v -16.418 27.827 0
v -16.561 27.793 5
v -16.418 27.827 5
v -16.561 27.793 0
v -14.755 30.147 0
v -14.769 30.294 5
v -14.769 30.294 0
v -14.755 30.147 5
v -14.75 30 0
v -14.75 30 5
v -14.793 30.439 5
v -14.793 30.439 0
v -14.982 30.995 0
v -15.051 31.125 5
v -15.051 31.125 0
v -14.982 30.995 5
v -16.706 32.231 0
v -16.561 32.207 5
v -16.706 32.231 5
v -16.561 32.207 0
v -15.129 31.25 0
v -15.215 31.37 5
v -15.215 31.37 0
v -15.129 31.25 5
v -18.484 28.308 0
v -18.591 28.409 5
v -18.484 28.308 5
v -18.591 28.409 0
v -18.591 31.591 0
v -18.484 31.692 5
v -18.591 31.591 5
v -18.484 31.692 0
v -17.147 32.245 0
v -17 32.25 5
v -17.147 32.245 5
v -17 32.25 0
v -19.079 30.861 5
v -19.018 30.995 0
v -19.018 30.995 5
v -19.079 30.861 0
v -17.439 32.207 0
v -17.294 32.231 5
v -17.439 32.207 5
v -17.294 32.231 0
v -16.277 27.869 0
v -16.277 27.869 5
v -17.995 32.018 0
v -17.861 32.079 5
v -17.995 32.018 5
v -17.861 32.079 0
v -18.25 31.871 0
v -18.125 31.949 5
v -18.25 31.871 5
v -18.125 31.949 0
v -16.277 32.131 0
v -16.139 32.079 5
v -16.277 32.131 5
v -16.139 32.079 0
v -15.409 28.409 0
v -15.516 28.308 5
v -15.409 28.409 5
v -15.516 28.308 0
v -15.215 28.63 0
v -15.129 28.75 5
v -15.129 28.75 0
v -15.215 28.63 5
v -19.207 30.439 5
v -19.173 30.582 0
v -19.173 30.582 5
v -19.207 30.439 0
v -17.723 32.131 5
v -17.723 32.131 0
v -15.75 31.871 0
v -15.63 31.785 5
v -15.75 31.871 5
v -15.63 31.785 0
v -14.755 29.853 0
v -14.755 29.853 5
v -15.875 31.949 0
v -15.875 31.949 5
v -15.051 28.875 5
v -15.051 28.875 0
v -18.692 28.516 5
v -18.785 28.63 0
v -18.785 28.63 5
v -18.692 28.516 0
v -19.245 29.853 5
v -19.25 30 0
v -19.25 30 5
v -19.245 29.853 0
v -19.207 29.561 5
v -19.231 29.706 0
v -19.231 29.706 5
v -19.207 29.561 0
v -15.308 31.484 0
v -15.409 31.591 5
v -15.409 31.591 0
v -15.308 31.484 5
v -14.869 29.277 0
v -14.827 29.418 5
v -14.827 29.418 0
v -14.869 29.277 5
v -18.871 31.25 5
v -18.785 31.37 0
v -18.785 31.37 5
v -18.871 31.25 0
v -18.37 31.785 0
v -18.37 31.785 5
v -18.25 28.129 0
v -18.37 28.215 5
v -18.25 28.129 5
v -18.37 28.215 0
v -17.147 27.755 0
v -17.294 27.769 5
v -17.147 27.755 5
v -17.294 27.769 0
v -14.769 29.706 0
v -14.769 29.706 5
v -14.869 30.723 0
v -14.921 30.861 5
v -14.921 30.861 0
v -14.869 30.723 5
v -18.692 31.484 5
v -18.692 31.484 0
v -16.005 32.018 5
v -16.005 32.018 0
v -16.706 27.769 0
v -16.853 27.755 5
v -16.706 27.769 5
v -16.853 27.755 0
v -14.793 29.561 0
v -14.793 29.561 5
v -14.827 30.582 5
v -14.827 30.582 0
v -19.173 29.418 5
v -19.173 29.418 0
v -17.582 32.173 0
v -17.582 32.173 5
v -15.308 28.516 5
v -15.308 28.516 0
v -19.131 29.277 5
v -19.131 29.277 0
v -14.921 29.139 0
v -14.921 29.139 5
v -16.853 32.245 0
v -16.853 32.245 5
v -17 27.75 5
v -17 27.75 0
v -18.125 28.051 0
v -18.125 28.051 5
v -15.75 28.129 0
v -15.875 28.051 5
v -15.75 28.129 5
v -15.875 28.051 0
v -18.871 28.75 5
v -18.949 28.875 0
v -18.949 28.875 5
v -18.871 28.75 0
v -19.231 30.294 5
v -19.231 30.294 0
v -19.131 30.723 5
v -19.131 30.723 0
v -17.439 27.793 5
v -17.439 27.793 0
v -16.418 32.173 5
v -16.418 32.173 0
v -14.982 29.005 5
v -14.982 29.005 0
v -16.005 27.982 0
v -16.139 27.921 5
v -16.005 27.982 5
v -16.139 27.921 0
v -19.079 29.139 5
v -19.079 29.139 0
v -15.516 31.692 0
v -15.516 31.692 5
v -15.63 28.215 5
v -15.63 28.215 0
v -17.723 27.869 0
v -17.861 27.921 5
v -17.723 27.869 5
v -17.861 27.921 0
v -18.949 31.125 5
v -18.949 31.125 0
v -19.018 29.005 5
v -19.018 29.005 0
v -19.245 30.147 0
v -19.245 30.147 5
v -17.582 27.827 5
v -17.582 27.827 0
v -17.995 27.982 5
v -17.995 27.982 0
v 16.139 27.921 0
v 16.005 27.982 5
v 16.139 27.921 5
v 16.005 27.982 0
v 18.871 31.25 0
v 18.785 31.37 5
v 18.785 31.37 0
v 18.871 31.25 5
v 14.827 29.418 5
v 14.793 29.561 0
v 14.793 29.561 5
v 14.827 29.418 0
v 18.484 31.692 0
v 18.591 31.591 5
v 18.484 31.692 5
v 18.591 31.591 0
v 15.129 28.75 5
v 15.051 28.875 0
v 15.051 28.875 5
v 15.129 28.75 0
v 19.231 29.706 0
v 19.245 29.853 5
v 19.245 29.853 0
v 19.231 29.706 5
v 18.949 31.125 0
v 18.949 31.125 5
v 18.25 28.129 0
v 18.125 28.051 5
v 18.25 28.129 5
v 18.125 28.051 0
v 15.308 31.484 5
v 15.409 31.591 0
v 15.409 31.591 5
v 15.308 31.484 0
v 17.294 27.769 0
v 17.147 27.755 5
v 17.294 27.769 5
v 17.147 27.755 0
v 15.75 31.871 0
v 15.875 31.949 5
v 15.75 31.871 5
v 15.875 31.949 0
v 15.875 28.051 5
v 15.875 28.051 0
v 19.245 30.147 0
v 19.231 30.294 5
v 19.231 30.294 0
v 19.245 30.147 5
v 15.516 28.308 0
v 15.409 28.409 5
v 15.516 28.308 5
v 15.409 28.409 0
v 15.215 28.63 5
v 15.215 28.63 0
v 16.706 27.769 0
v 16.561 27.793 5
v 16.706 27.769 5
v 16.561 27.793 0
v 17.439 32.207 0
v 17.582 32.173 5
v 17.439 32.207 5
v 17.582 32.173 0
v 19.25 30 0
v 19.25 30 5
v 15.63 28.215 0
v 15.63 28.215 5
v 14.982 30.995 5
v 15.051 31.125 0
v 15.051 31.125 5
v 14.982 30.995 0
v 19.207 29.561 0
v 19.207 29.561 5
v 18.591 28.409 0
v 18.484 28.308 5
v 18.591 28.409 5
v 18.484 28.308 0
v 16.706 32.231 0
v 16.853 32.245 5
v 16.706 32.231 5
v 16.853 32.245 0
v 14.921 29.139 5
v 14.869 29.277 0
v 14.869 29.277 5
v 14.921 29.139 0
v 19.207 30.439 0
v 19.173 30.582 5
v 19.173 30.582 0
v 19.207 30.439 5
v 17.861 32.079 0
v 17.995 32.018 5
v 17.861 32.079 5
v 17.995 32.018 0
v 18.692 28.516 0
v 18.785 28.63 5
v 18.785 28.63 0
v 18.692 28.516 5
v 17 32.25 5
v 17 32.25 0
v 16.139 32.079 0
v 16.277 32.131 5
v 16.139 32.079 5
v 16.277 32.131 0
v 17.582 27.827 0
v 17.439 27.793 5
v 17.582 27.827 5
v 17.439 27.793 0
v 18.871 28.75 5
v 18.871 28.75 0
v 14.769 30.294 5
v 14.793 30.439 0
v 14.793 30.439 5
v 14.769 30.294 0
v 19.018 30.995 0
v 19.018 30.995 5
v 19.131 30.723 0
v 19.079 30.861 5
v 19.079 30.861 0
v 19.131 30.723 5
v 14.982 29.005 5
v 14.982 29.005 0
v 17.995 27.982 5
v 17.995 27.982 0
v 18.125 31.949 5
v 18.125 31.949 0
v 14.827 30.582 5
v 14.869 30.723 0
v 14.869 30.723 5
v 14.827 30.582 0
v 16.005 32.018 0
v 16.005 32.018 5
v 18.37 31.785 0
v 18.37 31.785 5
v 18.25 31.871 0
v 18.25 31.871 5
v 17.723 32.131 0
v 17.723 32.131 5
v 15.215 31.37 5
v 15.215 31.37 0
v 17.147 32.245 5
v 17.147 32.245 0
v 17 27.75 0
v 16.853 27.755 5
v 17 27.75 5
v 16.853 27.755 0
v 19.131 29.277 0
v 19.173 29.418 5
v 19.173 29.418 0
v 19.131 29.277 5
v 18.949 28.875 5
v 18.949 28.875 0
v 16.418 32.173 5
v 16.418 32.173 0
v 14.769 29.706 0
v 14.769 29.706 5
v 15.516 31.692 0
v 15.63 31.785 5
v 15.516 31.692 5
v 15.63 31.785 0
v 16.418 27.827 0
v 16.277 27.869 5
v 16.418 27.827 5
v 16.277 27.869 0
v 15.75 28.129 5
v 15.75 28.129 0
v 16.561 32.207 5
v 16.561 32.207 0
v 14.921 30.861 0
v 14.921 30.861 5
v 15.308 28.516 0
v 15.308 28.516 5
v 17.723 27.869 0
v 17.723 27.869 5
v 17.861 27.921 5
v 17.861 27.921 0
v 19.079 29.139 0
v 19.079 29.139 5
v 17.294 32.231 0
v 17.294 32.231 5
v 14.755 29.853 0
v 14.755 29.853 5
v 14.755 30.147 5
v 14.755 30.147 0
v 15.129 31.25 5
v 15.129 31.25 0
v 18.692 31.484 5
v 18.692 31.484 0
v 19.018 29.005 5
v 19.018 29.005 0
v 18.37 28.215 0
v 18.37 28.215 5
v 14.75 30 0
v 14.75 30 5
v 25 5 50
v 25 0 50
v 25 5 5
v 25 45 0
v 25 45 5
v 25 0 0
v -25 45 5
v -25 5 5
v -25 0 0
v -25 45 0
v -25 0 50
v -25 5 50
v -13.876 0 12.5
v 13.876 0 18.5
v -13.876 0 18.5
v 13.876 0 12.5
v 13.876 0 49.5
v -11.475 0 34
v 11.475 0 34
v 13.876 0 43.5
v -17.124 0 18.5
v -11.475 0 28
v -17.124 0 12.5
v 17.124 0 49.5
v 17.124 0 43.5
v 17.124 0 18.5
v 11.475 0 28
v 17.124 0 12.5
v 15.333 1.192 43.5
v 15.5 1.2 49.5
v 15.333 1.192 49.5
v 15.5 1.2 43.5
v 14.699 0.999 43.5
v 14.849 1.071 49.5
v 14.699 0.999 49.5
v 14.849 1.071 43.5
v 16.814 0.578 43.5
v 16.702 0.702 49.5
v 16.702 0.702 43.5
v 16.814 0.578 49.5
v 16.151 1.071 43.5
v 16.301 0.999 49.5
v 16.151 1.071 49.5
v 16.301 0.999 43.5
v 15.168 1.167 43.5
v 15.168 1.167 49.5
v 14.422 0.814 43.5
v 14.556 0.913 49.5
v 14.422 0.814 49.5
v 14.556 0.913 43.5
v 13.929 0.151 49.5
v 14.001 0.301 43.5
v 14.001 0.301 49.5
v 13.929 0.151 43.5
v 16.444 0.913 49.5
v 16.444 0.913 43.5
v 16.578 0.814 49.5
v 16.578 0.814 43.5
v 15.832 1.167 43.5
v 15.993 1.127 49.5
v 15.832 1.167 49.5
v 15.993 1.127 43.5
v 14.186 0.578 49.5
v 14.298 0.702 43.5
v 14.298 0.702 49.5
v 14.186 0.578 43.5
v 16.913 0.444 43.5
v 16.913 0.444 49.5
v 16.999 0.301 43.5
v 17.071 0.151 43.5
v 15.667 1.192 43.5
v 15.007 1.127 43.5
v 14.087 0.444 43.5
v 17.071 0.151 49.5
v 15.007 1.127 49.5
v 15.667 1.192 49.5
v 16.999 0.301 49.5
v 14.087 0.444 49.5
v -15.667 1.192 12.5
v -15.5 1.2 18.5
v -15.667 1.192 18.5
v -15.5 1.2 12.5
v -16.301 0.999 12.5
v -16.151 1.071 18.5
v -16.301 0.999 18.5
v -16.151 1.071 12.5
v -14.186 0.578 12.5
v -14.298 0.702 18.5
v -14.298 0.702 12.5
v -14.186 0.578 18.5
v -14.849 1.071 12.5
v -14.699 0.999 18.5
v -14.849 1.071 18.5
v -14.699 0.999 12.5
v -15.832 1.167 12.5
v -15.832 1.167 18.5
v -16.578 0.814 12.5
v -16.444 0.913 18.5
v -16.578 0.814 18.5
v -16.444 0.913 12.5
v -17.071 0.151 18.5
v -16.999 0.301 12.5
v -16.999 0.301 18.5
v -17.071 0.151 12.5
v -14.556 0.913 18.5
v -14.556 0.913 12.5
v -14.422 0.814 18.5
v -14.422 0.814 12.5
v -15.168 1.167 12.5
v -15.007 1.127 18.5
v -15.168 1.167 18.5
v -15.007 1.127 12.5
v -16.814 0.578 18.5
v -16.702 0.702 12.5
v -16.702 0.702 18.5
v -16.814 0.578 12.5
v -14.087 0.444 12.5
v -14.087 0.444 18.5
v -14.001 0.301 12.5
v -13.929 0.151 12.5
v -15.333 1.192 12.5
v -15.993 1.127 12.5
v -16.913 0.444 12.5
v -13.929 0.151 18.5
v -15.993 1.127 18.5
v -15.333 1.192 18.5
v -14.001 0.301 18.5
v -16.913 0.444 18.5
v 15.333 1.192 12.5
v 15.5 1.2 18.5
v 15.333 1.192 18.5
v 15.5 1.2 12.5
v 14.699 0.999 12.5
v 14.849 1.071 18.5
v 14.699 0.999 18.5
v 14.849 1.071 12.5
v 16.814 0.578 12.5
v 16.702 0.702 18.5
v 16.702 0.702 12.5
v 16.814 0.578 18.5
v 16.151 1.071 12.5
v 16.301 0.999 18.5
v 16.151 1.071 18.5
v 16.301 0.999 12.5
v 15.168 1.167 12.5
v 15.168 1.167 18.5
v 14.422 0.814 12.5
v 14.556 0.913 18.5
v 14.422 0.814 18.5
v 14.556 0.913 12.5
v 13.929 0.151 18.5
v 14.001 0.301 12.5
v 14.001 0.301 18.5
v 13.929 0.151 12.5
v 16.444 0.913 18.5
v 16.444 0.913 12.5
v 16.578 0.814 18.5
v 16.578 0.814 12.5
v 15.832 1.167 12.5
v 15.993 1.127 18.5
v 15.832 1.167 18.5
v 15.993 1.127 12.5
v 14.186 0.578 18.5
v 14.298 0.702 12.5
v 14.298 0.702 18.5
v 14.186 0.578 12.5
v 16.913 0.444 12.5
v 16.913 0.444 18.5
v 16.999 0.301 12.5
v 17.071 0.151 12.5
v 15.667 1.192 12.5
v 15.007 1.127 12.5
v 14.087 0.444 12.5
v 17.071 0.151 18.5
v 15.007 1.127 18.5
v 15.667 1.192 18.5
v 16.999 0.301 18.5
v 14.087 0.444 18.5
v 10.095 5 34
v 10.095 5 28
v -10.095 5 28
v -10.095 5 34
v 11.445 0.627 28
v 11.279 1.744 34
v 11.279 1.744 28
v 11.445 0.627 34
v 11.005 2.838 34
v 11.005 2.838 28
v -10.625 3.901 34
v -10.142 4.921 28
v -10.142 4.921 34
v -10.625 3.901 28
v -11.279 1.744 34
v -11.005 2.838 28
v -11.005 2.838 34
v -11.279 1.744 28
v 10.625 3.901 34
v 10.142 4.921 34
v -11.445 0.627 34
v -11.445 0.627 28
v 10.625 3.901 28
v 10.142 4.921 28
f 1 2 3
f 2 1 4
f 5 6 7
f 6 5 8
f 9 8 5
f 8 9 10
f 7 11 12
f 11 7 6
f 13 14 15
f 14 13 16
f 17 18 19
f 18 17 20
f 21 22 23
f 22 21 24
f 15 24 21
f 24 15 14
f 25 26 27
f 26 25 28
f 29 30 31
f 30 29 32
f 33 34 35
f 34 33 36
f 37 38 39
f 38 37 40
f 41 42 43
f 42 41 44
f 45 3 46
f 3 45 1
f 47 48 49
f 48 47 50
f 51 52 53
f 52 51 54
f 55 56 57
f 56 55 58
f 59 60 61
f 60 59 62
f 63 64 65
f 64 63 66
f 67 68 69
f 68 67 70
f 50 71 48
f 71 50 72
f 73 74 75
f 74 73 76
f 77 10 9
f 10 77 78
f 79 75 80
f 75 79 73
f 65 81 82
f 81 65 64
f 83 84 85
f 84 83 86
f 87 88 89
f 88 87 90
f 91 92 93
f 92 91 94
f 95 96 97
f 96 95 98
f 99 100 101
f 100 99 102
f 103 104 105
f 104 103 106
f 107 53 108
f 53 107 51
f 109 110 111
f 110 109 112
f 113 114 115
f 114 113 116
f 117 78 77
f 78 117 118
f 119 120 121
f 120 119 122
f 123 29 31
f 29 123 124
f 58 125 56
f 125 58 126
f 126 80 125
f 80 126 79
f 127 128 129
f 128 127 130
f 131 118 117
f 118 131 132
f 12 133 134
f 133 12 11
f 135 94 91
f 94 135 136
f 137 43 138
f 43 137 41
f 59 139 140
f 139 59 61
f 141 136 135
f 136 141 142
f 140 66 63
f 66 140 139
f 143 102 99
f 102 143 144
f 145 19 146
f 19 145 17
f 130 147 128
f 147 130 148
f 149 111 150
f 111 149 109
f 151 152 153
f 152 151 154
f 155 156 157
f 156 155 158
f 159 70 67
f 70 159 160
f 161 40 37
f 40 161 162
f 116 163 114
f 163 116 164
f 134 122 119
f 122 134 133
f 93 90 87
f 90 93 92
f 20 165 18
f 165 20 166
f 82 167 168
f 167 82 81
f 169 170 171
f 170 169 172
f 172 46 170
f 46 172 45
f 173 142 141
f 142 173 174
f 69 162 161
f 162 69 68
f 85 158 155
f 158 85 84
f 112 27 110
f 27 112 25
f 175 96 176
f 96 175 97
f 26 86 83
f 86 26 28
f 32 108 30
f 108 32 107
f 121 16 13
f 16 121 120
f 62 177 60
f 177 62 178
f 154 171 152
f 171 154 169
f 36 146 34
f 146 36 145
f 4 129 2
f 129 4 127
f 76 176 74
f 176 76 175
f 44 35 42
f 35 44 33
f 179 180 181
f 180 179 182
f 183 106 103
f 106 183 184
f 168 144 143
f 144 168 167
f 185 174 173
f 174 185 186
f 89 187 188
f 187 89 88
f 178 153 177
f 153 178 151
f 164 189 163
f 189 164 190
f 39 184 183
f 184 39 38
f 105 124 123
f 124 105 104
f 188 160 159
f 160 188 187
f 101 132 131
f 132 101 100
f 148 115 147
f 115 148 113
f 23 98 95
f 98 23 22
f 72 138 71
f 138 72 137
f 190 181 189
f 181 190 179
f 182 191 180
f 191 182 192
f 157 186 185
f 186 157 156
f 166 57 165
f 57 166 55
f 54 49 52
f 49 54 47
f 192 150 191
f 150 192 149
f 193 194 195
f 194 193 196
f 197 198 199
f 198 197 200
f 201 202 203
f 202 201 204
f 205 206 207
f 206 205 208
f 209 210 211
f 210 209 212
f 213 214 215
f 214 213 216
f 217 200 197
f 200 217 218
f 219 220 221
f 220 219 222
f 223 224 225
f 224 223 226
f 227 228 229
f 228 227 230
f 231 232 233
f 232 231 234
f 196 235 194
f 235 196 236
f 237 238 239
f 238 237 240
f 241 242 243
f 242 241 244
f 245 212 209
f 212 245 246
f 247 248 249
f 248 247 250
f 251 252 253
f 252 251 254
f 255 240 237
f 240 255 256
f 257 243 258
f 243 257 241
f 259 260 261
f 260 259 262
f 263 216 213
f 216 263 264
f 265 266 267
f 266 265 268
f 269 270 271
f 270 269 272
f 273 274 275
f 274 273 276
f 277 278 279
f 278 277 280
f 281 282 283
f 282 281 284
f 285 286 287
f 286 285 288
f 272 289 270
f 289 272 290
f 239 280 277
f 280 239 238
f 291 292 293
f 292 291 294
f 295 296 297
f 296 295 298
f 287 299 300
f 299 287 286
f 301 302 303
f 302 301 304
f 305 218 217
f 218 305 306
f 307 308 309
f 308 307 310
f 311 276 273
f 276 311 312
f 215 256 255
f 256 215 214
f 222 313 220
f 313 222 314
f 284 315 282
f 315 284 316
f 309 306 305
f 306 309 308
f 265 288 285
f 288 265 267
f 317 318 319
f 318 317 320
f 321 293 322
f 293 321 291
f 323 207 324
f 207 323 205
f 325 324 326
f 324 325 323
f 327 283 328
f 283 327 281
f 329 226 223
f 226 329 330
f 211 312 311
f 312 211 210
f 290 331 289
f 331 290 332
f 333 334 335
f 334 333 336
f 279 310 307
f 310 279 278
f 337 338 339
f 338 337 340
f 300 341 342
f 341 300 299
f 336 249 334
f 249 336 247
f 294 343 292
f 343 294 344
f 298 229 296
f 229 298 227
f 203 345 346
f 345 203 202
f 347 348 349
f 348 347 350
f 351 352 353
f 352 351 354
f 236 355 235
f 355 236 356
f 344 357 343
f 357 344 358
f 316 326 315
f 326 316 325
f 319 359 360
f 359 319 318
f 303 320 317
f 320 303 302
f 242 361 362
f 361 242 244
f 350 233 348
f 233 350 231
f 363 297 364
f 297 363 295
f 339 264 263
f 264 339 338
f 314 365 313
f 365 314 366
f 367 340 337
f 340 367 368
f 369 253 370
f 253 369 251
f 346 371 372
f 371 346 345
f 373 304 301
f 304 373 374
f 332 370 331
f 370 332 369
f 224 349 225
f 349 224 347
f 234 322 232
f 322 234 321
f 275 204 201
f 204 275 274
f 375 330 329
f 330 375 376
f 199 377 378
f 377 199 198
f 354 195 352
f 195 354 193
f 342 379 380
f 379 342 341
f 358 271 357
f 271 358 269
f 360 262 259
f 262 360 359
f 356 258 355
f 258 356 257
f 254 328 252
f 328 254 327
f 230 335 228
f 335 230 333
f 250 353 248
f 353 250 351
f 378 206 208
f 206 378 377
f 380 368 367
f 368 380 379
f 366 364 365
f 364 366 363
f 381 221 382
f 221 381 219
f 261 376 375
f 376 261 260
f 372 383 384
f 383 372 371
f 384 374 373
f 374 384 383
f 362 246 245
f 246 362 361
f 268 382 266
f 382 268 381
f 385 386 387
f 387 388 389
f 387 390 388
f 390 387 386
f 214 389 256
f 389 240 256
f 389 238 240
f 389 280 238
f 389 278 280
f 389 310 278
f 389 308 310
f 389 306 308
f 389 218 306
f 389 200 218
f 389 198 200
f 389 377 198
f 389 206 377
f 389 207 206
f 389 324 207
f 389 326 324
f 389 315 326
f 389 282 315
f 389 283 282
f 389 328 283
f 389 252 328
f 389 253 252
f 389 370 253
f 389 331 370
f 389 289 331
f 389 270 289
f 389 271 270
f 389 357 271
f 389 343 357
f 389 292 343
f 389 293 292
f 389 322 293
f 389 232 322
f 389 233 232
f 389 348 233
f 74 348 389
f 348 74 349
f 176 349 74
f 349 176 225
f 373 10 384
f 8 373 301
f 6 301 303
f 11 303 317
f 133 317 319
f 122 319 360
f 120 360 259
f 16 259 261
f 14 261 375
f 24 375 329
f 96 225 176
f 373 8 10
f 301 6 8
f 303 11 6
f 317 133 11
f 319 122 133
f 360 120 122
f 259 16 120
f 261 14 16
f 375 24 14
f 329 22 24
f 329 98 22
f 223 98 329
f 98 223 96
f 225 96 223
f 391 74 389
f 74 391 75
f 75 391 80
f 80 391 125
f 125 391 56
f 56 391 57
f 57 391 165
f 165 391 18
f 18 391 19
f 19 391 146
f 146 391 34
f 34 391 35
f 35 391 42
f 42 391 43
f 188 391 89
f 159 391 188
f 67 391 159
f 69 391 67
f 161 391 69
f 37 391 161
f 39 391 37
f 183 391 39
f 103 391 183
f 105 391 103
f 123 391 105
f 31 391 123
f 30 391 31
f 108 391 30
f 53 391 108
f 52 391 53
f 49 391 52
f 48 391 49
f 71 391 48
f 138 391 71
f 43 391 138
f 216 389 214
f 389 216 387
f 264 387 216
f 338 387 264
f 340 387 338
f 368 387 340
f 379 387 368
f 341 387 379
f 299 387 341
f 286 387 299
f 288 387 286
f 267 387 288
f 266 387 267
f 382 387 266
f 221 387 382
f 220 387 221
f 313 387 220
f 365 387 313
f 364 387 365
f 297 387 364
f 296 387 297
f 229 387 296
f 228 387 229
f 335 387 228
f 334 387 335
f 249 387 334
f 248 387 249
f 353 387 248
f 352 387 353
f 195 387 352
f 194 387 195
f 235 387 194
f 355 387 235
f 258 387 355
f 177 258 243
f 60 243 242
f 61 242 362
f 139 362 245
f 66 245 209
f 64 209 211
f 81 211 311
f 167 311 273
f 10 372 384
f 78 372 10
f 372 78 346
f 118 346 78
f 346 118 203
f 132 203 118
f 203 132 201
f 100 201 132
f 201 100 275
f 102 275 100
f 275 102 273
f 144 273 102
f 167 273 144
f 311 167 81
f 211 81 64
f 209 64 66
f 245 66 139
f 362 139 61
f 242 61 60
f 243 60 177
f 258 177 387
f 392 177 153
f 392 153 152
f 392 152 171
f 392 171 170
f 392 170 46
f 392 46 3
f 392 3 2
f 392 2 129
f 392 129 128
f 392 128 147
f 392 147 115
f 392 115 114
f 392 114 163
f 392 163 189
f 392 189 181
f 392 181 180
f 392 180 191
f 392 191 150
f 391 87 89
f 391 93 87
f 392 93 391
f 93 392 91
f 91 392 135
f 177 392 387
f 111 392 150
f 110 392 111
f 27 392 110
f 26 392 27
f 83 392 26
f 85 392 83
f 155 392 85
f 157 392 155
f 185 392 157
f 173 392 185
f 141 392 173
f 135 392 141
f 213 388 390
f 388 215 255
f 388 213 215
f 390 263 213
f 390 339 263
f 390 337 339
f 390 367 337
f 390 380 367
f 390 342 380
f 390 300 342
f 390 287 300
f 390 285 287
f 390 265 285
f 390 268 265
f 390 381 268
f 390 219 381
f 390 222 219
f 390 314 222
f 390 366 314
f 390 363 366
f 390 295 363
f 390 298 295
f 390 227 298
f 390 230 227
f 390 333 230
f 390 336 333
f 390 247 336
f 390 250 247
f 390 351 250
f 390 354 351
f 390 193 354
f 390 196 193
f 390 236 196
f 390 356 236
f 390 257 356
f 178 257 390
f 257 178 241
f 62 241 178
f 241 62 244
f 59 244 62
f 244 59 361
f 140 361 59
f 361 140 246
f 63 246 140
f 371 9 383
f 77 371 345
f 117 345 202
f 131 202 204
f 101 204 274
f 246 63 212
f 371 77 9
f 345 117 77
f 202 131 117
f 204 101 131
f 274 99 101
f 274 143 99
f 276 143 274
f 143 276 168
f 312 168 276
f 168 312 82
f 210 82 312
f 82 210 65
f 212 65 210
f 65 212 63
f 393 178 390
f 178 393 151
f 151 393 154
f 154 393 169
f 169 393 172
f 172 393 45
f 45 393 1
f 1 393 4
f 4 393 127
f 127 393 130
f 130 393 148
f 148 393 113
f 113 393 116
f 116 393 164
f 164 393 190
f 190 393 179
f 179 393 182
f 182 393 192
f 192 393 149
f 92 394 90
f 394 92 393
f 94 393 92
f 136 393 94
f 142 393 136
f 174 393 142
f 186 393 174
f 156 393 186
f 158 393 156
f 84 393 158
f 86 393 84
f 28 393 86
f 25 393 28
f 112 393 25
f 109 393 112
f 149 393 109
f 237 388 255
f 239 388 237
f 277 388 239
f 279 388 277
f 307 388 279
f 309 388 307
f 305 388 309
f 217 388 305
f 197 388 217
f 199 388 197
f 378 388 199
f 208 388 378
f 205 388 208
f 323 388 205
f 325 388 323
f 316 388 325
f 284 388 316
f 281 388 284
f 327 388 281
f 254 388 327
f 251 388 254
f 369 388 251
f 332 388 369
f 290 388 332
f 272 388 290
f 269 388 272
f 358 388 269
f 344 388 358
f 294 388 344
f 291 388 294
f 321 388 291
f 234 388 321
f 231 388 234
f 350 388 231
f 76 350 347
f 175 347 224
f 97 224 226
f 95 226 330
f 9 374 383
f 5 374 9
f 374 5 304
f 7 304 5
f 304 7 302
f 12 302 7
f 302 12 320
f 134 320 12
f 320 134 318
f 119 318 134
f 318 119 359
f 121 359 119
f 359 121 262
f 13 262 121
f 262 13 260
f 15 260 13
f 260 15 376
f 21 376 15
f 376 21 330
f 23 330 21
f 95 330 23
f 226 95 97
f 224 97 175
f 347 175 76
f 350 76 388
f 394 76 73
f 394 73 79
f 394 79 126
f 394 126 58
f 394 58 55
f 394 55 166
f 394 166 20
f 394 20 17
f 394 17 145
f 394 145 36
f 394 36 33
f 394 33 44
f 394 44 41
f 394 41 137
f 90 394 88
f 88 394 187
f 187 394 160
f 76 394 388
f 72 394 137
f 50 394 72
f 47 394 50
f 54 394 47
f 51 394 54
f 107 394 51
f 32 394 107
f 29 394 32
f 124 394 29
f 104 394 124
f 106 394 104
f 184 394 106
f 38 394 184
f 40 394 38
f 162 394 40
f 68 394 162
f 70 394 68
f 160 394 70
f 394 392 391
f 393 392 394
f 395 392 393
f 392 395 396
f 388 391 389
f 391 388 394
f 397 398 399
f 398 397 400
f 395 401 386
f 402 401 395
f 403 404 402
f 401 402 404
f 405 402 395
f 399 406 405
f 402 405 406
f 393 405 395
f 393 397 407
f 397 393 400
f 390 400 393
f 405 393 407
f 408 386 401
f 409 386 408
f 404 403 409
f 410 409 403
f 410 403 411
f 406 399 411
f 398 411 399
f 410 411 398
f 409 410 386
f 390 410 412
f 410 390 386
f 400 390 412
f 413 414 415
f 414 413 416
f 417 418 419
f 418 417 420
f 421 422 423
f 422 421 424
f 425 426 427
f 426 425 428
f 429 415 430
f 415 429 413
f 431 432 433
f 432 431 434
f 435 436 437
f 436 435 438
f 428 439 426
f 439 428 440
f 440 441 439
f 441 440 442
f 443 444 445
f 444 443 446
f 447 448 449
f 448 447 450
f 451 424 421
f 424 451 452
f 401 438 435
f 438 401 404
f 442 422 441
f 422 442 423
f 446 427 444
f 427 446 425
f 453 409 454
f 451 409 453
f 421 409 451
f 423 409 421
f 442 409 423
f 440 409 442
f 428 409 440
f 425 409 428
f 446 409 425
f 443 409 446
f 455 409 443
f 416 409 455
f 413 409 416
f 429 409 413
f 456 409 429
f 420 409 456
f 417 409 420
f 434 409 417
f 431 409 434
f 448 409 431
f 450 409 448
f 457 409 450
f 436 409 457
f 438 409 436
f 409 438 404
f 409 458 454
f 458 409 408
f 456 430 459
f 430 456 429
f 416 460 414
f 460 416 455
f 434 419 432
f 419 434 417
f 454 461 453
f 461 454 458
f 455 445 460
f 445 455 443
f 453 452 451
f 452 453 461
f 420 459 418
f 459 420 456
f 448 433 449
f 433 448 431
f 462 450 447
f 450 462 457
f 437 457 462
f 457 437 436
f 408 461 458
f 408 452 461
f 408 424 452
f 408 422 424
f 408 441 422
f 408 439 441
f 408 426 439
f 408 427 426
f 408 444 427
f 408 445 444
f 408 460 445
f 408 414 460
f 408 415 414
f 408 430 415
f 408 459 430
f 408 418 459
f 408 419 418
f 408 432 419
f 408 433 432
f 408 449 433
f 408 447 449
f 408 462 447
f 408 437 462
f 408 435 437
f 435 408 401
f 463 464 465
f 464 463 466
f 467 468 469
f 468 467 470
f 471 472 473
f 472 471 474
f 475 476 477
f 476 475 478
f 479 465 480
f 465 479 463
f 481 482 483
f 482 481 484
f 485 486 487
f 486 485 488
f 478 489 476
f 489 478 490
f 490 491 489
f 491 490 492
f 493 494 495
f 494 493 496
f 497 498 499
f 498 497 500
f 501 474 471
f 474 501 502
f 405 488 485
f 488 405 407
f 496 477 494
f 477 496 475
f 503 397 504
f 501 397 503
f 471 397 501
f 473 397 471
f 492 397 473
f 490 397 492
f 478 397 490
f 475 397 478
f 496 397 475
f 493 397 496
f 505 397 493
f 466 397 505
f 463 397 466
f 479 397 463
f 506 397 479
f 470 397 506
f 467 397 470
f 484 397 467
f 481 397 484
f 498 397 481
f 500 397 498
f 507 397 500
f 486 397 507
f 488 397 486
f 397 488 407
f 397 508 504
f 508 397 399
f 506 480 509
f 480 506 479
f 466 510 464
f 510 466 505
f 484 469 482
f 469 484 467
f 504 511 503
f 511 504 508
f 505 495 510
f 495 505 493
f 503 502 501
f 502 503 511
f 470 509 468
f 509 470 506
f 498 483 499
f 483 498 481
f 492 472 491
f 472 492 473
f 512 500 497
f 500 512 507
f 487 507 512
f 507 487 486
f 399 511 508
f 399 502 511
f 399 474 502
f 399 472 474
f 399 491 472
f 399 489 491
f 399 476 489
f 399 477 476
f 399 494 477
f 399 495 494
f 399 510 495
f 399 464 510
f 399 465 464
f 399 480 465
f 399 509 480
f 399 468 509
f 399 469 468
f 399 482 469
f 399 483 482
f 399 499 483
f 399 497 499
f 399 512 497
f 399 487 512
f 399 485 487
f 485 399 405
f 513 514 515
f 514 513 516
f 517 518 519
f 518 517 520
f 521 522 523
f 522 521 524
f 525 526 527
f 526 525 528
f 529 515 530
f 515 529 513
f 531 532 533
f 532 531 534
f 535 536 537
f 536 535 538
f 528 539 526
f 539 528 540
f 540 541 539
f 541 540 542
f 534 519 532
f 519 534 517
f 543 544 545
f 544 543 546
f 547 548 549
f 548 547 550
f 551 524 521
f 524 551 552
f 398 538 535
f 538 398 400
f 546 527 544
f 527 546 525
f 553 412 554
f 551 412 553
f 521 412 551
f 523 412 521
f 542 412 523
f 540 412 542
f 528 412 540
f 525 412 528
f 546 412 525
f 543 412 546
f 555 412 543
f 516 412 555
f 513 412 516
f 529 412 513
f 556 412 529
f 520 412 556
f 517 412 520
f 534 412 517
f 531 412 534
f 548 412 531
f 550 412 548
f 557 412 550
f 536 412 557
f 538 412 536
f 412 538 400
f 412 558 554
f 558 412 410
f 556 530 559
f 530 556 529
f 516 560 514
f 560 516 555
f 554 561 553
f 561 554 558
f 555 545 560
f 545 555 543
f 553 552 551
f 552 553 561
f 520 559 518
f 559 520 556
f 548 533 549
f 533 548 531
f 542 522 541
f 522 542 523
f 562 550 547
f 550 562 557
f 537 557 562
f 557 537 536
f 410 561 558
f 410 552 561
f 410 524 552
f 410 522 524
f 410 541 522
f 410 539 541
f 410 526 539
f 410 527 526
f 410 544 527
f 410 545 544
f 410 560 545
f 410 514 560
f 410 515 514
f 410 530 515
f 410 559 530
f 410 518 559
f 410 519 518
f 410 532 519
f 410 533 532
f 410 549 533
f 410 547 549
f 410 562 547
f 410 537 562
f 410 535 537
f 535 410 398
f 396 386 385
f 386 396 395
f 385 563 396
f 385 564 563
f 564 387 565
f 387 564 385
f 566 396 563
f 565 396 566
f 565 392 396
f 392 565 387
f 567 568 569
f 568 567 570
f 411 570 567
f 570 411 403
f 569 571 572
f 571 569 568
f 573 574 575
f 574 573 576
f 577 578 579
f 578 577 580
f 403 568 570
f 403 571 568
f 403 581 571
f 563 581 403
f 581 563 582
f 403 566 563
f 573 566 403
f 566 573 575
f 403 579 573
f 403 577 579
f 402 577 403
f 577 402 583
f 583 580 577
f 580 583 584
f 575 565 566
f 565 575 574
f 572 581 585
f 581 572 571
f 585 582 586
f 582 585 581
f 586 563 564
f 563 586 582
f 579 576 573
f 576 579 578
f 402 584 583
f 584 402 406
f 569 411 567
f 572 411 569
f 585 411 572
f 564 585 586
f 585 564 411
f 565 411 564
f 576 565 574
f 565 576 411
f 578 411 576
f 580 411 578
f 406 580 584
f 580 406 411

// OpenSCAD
// L-shaped mounting bracket for NEMA 17 stepper motor (syringe pump)
// Print orientation: base plate on bed, vertical motor plate builds up +Z

// ---------------- Parameters ----------------
base_x0      = -25;   // base plate x start
base_x1      = 25;    // base plate x end
base_y0      = 0;     // base plate y start
base_y1      = 45;    // base plate y end
base_z0      = 0;     // base plate z start
base_z1      = 5;     // base plate z end

motor_plate_x0 = -25;  // motor plate x start (same as base)
motor_plate_x1 = 25;   // motor plate x end (same as base)
motor_plate_y0 = 0;    // motor plate y start (same as base)
motor_plate_y1 = 5;    // motor plate y end (back edge of base)
motor_plate_z0 = 0;    // motor plate z start (same as base)
motor_plate_z1 = 50;   // motor plate z end (top)

boss_d       = 23;     // motor centring boss hole diameter
boss_x       = 0;      // boss hole centre x
boss_z       = 28;     // boss hole centre z

screw_d      = 3.4;    // M3 screw hole diameter
screw_n      = 4;      // number of screw holes
screw_pitch  = 31;     // square pattern side length

gusset_t     = 5;      // gusset thickness (along X)
gusset_leg   = 20;     // right triangle legs along +Y and +Z
gusset_x0    = -25;    // gusset x start (left edge)
gusset_x1    = -20;    // gusset x end (left gusset)
gusset_x2    = 20;     // right gusset x start
gusset_x3    = 25;     // right gusset x end

eps          = 0.5;    // cutter overshoot past faces
$fn          = 96;     // curve resolution

// ---------------- Model ----------------
union() {
    // Base plate with two vertical through-holes (M4)
    difference() {
        translate([base_x0, base_y0, base_z0])
            cube([base_x1 - base_x0, base_y1 - base_y0, base_z1 - base_z0]);
        for (sx = [-17, 17])
            translate([sx, base_y1 - 15, -eps])
                cylinder(d = 4.5, h = base_z1 - base_z0 + 2 * eps);
    }

    // Vertical motor plate with boss hole and four M3 screw holes
    difference() {
        translate([motor_plate_x0, motor_plate_y0, motor_plate_z0])
            cube([motor_plate_x1 - motor_plate_x0,
                  motor_plate_y1 - motor_plate_y0,
                  motor_plate_z1 - motor_plate_z0]);
        // Boss hole along Y
        translate([boss_x, -eps, boss_z])
            cylinder(d = boss_d, h = motor_plate_y1 - motor_plate_y0 + 2 * eps, $fn = 64);
        // Screw holes on 31 mm square pattern, centred on boss hole
        for (i = [0 : screw_n - 1]) {
            a = screw_pitch / 2;
            x = boss_x + a * (i % 2 == 0 ? 1 : -1);
            z = boss_z + a * (i / 2 == 0 ? 1 : -1);
            translate([x, -eps, z])
                cylinder(d = screw_d, h = motor_plate_y1 - motor_plate_y0 + 2 * eps, $fn = 64);
        }
    }

    // Gussets flush with left and right edges
    for (gx = [gusset_x0, gusset_x2]) {
        translate([gx, 0, 0])
            linear_extrude(gusset_x3 - gx + eps)
                // right triangle in YZ plane: legs along +Y and +Z,
                // right-angle corner at y = 5, z = 5 (where the plates meet)
                translate([0, gusset_leg, gusset_leg])
                    cube([gusset_leg, gusset_t, gusset_leg]);
    }
}
